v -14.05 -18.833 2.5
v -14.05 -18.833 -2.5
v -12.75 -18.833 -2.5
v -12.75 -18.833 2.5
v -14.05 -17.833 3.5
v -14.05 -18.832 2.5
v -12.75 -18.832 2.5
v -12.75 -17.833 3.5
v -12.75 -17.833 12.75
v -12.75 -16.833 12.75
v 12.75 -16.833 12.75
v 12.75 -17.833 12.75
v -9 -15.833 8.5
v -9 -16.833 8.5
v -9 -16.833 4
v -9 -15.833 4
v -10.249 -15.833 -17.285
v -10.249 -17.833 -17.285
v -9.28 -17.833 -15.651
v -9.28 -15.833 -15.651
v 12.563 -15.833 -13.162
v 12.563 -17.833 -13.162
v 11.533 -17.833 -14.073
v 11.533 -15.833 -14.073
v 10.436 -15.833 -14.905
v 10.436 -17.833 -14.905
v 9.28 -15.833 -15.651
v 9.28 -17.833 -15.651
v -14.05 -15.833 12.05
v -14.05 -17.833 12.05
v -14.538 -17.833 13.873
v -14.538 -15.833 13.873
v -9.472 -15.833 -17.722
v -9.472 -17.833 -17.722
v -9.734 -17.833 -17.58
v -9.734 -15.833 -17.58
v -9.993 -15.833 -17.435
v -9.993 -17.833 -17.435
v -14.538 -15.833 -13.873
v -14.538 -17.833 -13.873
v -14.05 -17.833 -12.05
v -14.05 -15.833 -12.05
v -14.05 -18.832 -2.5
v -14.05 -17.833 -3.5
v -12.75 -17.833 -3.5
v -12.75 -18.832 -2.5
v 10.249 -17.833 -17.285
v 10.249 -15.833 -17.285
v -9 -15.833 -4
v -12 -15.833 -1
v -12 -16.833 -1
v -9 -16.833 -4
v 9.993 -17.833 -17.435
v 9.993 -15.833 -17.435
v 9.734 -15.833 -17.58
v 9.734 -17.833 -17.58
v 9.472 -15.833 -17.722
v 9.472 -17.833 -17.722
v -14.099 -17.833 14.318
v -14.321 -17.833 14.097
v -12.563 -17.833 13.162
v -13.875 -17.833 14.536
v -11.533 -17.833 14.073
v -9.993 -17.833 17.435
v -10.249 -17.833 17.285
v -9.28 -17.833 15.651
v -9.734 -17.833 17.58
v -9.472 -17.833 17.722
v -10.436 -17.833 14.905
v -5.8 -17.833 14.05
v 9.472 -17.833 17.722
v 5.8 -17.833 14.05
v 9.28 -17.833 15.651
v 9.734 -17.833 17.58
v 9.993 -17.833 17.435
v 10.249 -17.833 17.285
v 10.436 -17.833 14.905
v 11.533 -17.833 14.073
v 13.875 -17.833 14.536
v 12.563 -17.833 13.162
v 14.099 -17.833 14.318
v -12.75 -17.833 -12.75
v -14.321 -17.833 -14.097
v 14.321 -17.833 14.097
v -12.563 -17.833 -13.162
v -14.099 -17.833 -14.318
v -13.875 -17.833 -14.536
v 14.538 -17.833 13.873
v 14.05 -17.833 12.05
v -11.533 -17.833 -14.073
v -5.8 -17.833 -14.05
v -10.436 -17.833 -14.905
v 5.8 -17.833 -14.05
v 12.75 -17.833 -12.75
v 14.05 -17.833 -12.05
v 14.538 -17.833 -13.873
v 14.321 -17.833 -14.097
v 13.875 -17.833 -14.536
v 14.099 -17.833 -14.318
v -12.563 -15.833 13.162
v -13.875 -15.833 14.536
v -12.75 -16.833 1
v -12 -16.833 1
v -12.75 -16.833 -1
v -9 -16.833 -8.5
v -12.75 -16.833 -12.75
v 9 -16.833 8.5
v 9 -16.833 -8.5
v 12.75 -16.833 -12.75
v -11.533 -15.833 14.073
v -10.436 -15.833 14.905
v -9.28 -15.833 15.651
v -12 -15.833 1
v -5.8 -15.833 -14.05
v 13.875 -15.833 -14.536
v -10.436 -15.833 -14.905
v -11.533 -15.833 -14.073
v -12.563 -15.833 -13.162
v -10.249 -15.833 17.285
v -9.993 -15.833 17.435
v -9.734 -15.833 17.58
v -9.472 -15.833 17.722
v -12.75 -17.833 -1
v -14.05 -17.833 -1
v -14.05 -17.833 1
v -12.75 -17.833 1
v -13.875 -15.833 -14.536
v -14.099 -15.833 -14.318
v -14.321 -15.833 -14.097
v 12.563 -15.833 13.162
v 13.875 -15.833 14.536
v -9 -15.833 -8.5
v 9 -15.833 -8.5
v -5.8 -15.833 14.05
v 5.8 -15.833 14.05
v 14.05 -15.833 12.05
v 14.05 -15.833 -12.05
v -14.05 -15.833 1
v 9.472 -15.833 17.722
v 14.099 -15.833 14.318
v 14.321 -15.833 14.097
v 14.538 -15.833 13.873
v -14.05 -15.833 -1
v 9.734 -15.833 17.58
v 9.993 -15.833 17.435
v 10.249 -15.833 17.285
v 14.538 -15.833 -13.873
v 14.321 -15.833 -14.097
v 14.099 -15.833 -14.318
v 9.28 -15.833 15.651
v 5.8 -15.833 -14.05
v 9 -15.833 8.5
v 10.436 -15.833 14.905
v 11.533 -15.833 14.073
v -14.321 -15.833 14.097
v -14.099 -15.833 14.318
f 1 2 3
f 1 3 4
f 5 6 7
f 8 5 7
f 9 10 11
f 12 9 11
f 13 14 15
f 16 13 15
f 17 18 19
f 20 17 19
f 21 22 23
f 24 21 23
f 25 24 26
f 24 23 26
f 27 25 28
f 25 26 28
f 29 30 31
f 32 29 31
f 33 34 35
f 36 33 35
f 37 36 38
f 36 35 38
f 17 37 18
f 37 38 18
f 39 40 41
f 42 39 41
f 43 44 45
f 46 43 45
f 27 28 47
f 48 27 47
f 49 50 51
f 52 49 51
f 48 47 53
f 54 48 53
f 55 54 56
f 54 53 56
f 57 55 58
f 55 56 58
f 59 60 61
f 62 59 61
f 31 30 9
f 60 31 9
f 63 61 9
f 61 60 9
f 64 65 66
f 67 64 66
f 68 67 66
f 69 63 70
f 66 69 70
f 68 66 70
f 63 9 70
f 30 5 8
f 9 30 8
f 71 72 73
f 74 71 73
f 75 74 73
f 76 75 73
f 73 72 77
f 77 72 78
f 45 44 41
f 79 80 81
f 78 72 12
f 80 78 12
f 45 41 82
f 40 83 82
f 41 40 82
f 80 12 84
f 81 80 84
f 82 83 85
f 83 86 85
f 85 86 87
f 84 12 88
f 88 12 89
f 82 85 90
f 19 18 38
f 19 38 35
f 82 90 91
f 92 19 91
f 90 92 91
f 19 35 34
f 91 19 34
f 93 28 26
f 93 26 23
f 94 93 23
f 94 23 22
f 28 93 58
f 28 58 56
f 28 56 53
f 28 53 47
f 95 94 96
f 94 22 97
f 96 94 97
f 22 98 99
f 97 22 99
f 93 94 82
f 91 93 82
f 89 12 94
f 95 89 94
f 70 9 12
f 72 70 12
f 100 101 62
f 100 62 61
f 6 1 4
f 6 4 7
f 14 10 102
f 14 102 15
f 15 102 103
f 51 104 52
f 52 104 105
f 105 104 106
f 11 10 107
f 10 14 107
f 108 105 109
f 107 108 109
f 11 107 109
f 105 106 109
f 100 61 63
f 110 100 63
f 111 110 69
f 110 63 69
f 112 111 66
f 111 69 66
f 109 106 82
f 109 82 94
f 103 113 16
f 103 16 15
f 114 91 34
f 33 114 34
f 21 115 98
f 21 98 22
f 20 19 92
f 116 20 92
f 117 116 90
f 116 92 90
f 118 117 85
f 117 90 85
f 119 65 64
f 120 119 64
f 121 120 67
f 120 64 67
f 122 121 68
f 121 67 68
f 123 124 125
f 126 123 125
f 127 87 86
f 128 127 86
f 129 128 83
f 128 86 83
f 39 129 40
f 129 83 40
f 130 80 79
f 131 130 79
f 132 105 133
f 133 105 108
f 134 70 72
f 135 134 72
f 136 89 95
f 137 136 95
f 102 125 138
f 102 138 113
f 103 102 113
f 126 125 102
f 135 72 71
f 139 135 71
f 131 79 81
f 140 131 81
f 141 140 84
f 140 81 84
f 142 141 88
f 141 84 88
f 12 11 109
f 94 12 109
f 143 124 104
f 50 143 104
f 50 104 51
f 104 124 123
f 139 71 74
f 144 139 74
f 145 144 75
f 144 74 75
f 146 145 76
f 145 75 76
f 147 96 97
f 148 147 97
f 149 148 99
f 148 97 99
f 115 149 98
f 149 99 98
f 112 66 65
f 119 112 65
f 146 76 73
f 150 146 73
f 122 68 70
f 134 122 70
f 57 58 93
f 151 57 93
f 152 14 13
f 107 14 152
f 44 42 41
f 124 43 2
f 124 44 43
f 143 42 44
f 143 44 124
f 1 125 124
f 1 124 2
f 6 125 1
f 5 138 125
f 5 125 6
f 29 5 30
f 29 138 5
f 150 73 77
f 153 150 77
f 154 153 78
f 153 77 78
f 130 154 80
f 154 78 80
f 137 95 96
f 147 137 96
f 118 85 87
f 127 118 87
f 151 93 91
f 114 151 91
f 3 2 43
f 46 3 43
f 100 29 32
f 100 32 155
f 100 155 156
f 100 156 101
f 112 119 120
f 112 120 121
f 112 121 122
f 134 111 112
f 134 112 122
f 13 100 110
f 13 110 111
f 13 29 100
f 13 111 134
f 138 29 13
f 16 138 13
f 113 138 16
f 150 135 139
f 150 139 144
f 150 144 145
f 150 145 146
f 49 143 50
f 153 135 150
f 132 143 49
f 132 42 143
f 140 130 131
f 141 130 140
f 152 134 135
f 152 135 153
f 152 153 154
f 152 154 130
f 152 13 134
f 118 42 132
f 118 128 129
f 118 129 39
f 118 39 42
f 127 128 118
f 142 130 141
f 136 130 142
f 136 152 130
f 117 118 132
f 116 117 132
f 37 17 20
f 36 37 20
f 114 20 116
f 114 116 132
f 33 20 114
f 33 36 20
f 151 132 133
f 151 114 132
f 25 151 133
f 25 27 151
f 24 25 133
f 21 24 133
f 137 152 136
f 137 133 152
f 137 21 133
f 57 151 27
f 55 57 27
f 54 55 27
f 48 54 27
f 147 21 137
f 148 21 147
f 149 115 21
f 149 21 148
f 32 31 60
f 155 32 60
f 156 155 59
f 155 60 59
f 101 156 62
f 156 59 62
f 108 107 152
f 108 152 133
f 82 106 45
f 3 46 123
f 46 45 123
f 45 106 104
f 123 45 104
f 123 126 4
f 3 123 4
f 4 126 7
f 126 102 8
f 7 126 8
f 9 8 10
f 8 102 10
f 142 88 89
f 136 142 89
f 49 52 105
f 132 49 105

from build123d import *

# Parameters (mm, degrees)
BOSS_EXTRUDE3_DEPTH      = 1
BOSS_EXTRUDE3_DEPTH_BACK = 1
SKETCH3_W                = 18
SKETCH3_H                = 17
CUT_EXTRUDE1_DEPTH       = 23.944525539
SKETCH3_4_W              = 25.5
SKETCH3_4_H              = 25.5
SKETCH3_4_W_2            = 18
SKETCH3_4_H_2            = 17
CUT_EXTRUDE3_DEPTH       = 23.944525539
CUT_EXTRUDE4_DEPTH       = 23.944525539
CUT_EXTRUDE4_DEPTH_BACK  = 23.944525539
SKETCH4_W                = 16
SKETCH4_H                = 2
CHAMFER1_SIZE            = 3
SKETCH6_W                = 5
SKETCH6_H                = 1
BOSS_EXTRUDE5_DEPTH      = 1.3
CHAMFER2_SIZE            = 1


with BuildPart() as part:
    # Sketch2 → Boss-Extrude3 (new, two sides: drawn at the far end of the back side and taken through both)
    with BuildSketch(Plane(origin=(0, -16.832566415, 0), x_dir=(1, 0, 0), z_dir=(0, 1, 0)).offset(-BOSS_EXTRUDE3_DEPTH_BACK)):
        with BuildLine():
            Line((14.05, -12.05), (14.05, 12.05))
            Line((14.05, 12.05), (14.538378439, 13.872653149))
            ThreePointArc((14.538378439, 13.872653149), (14.210517369, 14.208312678), (13.874908715, 14.536225824))
            Line((13.874908715, 14.536225824), (12.56303347, 13.16182292))
            ThreePointArc((12.56303347, 13.16182292), (10.992315824, 14.499392587), (9.280277793, 15.650553876))
            Line((9.280277793, 15.650553876), (10.249356378, 17.284838642))
            ThreePointArc((10.249356378, 17.284838642), (9.863353095, 17.507975862), (9.47249431, 17.72249431))
            Line((9.47249431, 17.72249431), (5.8, 14.05))
            Line((5.8, 14.05), (-5.8, 14.05))
            Line((-5.8, 14.05), (-9.47249431, 17.72249431))
            ThreePointArc((-9.47249431, 17.72249431), (-9.863353095, 17.507975862), (-10.249356378, 17.284838642))
            Line((-10.249356378, 17.284838642), (-9.280277793, 15.650553876))
            ThreePointArc((-9.280277793, 15.650553876), (-10.992315824, 14.499392587), (-12.56303347, 13.16182292))
            Line((-12.56303347, 13.16182292), (-13.874908715, 14.536225824))
            ThreePointArc((-13.874908715, 14.536225824), (-14.210517369, 14.208312678), (-14.538378439, 13.872653149))
            Line((-14.538378439, 13.872653149), (-14.05, 12.05))
            Line((-14.05, 12.05), (-14.05, -12.05))
            Line((-14.05, -12.05), (-14.538378439, -13.872653149))
            ThreePointArc((-14.538378439, -13.872653149), (-14.210517369, -14.208312678), (-13.874908715, -14.536225824))
            Line((-13.874908715, -14.536225824), (-12.56303347, -13.16182292))
            ThreePointArc((-12.56303347, -13.16182292), (-10.992315824, -14.499392587), (-9.280277793, -15.650553876))
            Line((-9.280277793, -15.650553876), (-10.249356378, -17.284838642))
            ThreePointArc((-10.249356378, -17.284838642), (-9.863353095, -17.507975862), (-9.47249431, -17.72249431))
            Line((-9.47249431, -17.72249431), (-5.8, -14.05))
            Line((-5.8, -14.05), (5.8, -14.05))
            Line((5.8, -14.05), (9.47249431, -17.72249431))
            ThreePointArc((9.47249431, -17.72249431), (9.863353095, -17.507975862), (10.249356378, -17.284838642))
            Line((10.249356378, -17.284838642), (9.280277793, -15.650553876))
            ThreePointArc((9.280277793, -15.650553876), (10.992315824, -14.499392587), (12.56303347, -13.16182292))
            Line((12.56303347, -13.16182292), (13.874908715, -14.536225824))
            ThreePointArc((13.874908715, -14.536225824), (14.210517369, -14.208312678), (14.538378439, -13.872653149))
            Line((14.538378439, -13.872653149), (14.05, -12.05))
        make_face()
    extrude(amount=BOSS_EXTRUDE3_DEPTH + BOSS_EXTRUDE3_DEPTH_BACK)

    # Sketch3 → Cut-Extrude1 (cut, through all)
    with BuildSketch(Plane(origin=(0, -16.832566415, 0), x_dir=(1, 0, 0), z_dir=(0, 1, 0))):
        Rectangle(SKETCH3_W, SKETCH3_H)
    extrude(amount=CUT_EXTRUDE1_DEPTH, mode=Mode.SUBTRACT)

    # Sketch3<4> → Cut-Extrude3 (cut, through all)
    # profile 1 of 2: a face of its own
    with BuildSketch(Plane(origin=(0, -16.832566415, 0), x_dir=(1, 0, 0), z_dir=(0, 1, 0))):
        Rectangle(SKETCH3_4_W, SKETCH3_4_H)
        Rectangle(SKETCH3_4_W_2, SKETCH3_4_H_2, mode=Mode.SUBTRACT)
    # profile 2 of 2: a face of its own
    with BuildSketch(Plane(origin=(0, -16.832566415, 0), x_dir=(1, 0, 0), z_dir=(0, 1, 0))):
        Rectangle(SKETCH3_4_W_2, SKETCH3_4_H_2)
    extrude(amount=-CUT_EXTRUDE3_DEPTH, mode=Mode.SUBTRACT)

    # Sketch4 → Cut-Extrude4 (cut, two sides: drawn at the far end of the back side and taken through both)
    with BuildSketch(Plane(origin=(0, -16.832566415, 0), x_dir=(1, 0, 0), z_dir=(0, 1, 0)).offset(-CUT_EXTRUDE4_DEPTH_BACK)):
        with Locations((-13.844488576, 0)):
            Rectangle(SKETCH4_W, SKETCH4_H)
    extrude(amount=CUT_EXTRUDE4_DEPTH + CUT_EXTRUDE4_DEPTH_BACK, mode=Mode.SUBTRACT)

    # Chamfer1
    chamfer1_edges = [part.edges().sort_by_distance(p)[0] for p in [
        (-9, -16.332566415, -1),
        (-9, -16.332566415, 1),
    ]]
    chamfer(chamfer1_edges, length=CHAMFER1_SIZE)

    # Sketch6 → Boss-Extrude5 (add)
    with BuildSketch(Plane.ZY.offset(14.05)):
        with Locations((0, -18.332566415)):
            Rectangle(SKETCH6_W, SKETCH6_H)
    extrude(amount=-BOSS_EXTRUDE5_DEPTH)

    # Chamfer2
    chamfer2_edges = [part.edges().sort_by_distance(p)[0] for p in [
        (-13.4, -17.832566415, 2.5),
        (-13.4, -17.832566415, -2.5),
    ]]
    chamfer(chamfer2_edges, length=CHAMFER2_SIZE - 0.0001)  # a hair under: the kernel refuses the full size


solid = part.part
